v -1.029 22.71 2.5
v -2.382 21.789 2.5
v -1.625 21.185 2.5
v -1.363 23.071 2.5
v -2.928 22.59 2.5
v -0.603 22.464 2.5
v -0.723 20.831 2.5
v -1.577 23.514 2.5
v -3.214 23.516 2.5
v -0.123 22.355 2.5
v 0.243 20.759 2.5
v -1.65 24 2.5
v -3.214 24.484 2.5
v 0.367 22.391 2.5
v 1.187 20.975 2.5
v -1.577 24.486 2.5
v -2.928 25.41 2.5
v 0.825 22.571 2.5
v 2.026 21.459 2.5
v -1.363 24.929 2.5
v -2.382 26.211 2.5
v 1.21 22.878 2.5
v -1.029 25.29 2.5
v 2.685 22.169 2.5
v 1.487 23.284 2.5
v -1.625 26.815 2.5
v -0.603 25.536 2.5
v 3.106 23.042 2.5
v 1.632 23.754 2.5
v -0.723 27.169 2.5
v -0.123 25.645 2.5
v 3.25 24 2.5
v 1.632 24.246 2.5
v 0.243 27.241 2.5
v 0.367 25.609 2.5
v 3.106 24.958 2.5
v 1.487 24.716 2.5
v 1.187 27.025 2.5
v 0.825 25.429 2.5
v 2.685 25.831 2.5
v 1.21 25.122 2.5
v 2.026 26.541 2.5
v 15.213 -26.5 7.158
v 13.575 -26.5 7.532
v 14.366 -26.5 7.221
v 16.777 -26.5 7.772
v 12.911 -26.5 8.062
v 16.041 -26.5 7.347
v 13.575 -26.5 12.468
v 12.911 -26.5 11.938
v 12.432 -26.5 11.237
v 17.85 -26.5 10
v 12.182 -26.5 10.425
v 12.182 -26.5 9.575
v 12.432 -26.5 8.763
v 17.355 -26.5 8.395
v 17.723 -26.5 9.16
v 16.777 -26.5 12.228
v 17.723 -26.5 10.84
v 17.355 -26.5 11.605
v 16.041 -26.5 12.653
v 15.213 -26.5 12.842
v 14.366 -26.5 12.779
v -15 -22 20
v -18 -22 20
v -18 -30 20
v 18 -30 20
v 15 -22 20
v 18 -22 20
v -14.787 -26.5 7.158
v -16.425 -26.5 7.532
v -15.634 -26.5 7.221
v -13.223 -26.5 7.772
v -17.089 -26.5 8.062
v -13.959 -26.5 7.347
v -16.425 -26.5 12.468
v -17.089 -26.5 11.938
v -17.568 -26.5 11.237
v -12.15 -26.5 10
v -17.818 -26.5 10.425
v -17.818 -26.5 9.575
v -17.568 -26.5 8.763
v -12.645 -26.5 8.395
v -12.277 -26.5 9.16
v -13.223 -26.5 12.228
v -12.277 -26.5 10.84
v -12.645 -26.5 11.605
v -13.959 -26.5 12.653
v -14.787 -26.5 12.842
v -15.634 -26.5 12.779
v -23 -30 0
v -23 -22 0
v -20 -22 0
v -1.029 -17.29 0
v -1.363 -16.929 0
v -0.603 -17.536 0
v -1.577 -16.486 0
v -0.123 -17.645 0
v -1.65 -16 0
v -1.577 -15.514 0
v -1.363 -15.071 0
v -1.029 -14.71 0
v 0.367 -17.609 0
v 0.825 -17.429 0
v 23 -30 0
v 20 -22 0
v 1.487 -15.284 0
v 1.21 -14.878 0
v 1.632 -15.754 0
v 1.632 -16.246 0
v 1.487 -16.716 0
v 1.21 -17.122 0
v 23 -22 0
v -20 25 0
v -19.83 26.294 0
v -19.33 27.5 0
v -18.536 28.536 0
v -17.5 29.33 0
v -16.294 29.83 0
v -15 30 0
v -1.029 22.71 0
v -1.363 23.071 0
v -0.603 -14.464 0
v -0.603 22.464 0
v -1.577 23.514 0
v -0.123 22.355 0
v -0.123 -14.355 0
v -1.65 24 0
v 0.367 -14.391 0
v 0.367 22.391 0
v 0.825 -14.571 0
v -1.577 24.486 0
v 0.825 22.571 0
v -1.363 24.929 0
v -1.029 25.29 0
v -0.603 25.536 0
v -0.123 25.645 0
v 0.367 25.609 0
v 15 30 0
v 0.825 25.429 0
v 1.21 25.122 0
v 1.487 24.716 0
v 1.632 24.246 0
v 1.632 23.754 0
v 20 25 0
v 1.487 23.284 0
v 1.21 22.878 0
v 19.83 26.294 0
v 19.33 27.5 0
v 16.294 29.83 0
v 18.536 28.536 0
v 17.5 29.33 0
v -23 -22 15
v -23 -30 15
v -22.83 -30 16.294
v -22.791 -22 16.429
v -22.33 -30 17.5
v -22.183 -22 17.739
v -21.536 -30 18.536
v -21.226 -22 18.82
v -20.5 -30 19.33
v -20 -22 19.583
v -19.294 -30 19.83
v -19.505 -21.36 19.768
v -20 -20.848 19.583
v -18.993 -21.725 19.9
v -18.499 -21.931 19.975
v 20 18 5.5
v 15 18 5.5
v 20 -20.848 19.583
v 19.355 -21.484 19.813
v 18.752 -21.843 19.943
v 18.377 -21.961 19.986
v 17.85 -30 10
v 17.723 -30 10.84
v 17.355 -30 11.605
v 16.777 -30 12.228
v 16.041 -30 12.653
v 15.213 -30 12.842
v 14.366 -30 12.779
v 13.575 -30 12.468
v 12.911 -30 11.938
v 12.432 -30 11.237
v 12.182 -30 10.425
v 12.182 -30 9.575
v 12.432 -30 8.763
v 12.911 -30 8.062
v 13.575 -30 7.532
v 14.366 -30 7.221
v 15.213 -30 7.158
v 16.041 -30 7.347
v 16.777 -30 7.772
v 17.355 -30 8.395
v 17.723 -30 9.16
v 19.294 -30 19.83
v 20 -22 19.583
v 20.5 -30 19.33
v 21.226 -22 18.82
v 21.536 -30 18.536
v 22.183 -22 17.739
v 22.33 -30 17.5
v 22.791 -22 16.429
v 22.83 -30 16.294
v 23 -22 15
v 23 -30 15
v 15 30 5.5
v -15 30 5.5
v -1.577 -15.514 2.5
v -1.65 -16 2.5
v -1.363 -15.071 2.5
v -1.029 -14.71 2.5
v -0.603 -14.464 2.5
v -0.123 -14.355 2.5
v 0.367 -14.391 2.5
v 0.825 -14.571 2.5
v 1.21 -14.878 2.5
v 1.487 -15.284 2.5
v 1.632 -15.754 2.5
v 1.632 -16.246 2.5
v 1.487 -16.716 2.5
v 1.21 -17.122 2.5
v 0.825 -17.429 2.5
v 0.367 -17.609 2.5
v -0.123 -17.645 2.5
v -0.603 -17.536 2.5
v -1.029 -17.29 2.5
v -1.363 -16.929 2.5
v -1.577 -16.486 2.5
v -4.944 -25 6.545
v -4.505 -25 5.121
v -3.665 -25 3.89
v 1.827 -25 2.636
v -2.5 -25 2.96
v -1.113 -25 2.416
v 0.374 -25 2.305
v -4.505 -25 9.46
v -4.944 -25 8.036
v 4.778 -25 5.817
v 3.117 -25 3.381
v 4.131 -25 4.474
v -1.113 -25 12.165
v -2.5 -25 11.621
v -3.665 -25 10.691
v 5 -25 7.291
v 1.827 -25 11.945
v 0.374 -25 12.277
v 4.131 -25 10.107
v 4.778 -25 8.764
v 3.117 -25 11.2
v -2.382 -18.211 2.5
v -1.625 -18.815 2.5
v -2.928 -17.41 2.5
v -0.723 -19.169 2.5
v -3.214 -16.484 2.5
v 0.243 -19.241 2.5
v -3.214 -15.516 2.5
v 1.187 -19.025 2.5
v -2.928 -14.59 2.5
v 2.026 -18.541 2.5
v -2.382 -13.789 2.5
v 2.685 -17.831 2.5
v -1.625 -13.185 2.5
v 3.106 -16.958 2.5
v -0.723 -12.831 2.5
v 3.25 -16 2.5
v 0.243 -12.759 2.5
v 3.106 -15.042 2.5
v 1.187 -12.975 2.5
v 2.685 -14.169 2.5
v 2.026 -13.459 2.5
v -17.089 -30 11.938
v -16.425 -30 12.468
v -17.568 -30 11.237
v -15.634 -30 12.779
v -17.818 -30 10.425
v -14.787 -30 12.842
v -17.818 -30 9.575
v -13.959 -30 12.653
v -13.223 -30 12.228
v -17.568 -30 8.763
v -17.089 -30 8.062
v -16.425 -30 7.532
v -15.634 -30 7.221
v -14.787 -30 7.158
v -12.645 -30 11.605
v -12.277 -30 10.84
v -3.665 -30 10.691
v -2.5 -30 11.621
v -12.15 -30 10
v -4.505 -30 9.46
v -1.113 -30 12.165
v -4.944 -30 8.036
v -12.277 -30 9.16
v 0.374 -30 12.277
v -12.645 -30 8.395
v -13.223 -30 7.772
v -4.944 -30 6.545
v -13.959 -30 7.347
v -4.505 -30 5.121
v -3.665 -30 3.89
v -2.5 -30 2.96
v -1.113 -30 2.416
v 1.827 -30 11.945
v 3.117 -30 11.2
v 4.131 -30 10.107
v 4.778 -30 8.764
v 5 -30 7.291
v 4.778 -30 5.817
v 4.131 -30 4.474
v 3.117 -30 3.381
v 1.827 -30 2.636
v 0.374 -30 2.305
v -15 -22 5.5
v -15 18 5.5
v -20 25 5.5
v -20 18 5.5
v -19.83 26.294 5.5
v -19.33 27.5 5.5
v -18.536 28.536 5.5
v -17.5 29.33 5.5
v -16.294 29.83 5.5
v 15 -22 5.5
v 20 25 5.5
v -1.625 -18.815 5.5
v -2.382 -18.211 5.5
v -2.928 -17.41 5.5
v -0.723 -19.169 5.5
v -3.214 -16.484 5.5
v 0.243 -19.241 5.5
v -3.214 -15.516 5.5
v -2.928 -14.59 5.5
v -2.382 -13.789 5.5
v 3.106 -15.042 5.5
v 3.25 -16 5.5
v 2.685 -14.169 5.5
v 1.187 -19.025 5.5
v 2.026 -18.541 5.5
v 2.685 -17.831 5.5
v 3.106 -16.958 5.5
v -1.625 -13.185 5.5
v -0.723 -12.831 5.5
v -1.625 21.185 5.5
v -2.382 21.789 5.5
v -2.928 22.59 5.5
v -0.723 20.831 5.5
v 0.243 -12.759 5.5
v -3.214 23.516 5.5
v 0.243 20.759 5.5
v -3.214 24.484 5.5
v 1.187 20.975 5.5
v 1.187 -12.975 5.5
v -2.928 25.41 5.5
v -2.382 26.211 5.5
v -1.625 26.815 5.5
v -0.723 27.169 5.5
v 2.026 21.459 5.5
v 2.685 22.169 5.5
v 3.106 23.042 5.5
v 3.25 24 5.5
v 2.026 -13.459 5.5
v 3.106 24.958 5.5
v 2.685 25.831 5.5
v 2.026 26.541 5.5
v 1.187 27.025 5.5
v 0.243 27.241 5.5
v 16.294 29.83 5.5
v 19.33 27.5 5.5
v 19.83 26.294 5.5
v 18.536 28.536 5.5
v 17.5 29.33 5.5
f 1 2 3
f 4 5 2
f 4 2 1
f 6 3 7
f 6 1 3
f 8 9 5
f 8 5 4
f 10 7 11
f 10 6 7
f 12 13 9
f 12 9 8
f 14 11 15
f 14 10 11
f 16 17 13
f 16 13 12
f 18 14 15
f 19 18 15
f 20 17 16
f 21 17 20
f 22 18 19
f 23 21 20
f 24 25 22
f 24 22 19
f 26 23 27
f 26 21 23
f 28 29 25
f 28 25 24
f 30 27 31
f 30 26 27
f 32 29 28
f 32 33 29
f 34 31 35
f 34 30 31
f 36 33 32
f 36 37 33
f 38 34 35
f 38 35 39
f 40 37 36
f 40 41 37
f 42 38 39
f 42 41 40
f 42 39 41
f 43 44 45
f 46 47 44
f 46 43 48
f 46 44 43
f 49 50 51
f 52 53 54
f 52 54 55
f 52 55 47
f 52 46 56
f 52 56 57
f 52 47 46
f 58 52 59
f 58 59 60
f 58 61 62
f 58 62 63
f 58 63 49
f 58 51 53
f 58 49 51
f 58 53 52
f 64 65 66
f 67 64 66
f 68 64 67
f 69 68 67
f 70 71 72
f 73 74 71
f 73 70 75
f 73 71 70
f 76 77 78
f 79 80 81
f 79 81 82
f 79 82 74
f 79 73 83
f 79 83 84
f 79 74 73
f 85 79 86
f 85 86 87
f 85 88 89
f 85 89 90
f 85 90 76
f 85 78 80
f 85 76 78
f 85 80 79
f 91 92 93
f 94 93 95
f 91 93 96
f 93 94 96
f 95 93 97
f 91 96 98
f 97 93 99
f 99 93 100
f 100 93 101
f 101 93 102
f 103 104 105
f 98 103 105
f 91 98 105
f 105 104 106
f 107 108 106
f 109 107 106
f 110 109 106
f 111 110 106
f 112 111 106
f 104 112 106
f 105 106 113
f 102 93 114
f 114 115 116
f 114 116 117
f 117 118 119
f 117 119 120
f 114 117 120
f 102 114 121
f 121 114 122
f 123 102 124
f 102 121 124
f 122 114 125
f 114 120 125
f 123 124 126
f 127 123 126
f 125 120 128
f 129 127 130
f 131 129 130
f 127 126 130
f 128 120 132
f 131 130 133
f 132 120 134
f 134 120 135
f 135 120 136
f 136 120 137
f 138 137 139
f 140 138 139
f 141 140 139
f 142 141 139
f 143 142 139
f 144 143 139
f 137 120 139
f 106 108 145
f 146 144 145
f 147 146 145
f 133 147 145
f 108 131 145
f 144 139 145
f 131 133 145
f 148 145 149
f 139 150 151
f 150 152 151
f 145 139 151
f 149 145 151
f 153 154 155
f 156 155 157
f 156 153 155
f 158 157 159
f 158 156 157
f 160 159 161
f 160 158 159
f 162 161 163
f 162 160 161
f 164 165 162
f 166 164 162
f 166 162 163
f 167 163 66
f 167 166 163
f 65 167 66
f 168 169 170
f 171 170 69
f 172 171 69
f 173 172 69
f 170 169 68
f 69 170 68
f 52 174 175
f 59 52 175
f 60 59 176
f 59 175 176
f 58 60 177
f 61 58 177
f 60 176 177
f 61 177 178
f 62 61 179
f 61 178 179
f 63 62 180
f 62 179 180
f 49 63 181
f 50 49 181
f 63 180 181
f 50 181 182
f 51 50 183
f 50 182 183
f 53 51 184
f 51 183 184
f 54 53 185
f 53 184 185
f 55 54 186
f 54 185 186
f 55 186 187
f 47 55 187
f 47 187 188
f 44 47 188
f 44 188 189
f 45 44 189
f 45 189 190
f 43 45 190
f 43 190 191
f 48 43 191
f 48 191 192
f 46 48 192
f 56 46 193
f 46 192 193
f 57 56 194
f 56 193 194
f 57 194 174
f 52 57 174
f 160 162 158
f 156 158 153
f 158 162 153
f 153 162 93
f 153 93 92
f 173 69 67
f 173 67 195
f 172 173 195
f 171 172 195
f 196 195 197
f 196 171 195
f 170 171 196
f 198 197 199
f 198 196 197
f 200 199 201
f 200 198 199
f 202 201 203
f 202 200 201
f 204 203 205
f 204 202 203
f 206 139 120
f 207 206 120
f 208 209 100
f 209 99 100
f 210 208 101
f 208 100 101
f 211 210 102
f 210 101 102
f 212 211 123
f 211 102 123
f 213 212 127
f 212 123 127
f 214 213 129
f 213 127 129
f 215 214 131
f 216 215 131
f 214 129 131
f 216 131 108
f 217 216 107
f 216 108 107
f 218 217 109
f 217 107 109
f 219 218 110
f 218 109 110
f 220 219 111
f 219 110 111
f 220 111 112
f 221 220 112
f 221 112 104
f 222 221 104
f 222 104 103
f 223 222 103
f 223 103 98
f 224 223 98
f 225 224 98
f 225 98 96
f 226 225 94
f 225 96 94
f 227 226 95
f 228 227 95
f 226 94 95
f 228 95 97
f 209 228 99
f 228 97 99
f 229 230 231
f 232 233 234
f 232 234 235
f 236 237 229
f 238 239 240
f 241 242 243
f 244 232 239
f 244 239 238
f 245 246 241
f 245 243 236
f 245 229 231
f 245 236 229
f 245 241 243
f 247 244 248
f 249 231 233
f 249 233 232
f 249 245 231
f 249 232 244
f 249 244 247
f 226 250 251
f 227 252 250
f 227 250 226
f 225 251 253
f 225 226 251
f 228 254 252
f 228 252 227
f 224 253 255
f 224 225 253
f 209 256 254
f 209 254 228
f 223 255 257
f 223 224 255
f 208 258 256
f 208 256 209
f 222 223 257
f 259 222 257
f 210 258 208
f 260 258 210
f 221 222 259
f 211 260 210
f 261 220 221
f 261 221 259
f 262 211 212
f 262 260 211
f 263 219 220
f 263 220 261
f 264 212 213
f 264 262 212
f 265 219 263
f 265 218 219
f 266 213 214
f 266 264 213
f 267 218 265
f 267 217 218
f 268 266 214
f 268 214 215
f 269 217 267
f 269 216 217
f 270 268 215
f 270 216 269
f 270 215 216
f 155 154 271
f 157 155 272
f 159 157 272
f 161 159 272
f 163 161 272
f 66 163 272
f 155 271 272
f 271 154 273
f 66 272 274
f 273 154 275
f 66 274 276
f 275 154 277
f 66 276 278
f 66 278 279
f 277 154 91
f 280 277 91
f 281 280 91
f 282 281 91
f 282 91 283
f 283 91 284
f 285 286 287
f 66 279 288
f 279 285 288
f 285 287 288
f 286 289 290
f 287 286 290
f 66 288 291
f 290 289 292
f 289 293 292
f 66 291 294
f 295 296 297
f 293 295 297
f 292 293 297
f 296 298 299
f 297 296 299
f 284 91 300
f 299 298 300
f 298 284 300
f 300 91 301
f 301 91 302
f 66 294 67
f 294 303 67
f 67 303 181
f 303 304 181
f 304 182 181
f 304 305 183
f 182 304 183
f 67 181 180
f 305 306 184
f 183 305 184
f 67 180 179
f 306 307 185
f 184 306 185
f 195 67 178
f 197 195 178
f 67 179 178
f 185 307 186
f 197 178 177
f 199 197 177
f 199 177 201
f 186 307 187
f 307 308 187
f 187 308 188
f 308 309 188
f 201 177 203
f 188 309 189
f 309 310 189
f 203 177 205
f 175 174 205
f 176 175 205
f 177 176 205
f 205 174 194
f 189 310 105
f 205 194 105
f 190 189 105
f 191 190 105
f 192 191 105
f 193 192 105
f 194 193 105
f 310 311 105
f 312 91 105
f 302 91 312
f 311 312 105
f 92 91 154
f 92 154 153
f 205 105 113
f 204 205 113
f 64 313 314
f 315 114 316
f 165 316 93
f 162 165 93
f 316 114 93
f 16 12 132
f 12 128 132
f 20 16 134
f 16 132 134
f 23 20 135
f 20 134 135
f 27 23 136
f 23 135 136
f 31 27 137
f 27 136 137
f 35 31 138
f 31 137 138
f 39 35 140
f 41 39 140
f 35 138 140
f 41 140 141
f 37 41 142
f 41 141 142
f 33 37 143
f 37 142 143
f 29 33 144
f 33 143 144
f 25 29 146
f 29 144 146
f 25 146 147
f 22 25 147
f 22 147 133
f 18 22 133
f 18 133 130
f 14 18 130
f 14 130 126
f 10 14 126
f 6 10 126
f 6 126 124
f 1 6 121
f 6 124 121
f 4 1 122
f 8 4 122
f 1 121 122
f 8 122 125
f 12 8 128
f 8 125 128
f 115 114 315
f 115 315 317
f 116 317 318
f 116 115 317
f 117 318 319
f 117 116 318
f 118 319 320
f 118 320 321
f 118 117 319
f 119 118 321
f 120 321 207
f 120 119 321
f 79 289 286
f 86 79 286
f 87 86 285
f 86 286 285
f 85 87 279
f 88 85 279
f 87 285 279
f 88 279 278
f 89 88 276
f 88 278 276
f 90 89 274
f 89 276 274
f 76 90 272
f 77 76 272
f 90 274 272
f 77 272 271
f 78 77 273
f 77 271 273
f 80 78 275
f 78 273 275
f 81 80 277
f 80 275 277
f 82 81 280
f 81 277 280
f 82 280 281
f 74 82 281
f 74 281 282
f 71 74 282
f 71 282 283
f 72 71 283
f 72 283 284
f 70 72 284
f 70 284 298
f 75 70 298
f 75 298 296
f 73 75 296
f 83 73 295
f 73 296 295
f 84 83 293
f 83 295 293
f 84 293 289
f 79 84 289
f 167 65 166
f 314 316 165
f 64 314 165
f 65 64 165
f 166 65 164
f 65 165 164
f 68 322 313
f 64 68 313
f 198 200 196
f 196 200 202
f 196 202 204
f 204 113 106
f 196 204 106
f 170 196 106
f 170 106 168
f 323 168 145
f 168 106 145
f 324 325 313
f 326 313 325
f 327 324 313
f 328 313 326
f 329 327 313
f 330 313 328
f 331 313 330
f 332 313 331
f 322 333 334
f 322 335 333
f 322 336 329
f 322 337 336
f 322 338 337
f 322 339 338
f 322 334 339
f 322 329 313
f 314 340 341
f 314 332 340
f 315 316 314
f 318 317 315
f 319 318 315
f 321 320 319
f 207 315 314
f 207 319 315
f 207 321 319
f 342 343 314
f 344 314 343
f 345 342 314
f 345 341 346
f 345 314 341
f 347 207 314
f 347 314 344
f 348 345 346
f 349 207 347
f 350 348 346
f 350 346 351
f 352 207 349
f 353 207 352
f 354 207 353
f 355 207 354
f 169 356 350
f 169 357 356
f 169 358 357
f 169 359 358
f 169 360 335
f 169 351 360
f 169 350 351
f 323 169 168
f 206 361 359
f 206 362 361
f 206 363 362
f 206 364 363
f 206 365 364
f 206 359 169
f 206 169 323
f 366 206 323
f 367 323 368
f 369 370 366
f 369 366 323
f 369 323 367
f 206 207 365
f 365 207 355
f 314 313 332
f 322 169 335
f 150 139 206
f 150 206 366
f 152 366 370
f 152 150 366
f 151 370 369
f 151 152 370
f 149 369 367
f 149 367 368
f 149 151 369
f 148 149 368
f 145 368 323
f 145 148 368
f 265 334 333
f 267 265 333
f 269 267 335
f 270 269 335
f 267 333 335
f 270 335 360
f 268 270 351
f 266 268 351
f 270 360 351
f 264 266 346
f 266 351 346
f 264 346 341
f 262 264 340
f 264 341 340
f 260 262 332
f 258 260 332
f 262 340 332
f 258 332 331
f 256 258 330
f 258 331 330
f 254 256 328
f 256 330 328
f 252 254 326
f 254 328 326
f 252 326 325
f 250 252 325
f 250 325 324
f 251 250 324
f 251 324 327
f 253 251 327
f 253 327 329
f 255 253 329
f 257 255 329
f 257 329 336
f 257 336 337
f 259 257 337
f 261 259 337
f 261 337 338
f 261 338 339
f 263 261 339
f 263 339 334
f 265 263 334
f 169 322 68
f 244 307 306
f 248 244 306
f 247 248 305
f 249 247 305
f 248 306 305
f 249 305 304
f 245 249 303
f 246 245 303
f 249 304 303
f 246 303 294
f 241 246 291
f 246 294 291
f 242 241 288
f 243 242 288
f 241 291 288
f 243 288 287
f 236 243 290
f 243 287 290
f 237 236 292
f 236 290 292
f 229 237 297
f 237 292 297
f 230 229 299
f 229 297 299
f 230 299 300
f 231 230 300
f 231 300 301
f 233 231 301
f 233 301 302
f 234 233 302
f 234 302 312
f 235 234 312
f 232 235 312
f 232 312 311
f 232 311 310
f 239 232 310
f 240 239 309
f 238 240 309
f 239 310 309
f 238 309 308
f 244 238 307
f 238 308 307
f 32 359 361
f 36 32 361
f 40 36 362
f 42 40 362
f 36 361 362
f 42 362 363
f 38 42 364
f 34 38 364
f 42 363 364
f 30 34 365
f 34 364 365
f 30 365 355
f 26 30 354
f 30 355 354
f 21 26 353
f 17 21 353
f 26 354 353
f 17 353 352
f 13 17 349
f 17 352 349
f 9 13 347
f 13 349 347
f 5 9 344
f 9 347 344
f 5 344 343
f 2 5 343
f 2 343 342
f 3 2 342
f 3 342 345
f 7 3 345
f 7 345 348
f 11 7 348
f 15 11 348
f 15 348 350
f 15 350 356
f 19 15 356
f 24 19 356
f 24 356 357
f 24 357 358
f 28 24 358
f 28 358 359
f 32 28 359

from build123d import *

# Parameters (mm, degrees)
F0_W           = 3
F0_H           = 8
F1_DEPTH       = 20
F0_W_2         = 30
F0_H_2         = 12
F0_H_3         = 40
F0_W_3         = 5
F2_DEPTH       = 5.5
F3_DEPTH       = 20
F5_DEPTH       = 43.001
F7_D           = 3.3
F7_DEPTH       = 13.5002857143
F7_CBORE_D     = 6.5
F7_CBORE_DEPTH = 3
F7_TIP         = 0.9914200214
F8_R           = 5
F9_DEPTH       = 5
F8_R_2         = 2.85
F10_DEPTH      = 3.5
F11_T1_DEPTH   = 30.5
F11_T3_DEPTH   = 33


# Not quite as in the source:
# - a fillet or chamfer that OpenCascade refuses, or shapes differently, is made with other operations: its cross-section is extruded or revolved along the edge and cut away or added


with BuildPart() as f1:
    # F0 (on Top) → F1 (new body)
    with BuildSketch(Plane.XY):
        Polygon((20, -30), (20, -22), (15, -22), (-15, -22), (-20, -22), (-20, -30), align=None)
        with Locations((-21.5, -26)):
            Rectangle(F0_W, F0_H)
        with Locations((21.5, -26)):
            Rectangle(F0_W, F0_H)
    extrude(amount=F1_DEPTH)

    # F0 (on Top) → F2 (join)
    with BuildSketch(Plane.XY):
        with Locations((0, 24)):
            Rectangle(F0_W_2, F0_H_2)
        with Locations((0, -2)):
            Rectangle(F0_W_2, F0_H_3)
        with Locations((-17.5, 24)):
            Rectangle(F0_W_3, F0_H_2)
        with Locations((-17.5, -2)):
            Rectangle(F0_W_3, F0_H_3)
        with Locations((17.5, 24)):
            Rectangle(F0_W_3, F0_H_2)
        with Locations((17.5, -2)):
            Rectangle(F0_W_3, F0_H_3)
    extrude(amount=F2_DEPTH)

    # F0 (on Top) → F3 (join)
    with BuildSketch(Plane.XY):
        with Locations((-17.5, -2)):
            Rectangle(F0_W_3, F0_H_3)
        with Locations((17.5, -2)):
            Rectangle(F0_W_3, F0_H_3)
    extrude(amount=F3_DEPTH)

    # F4 (on face) → F5 (cut, through all)
    with BuildSketch(Plane(origin=(-20, 0, 0), x_dir=(0, -1, 0), z_dir=(-1, 0, 0))):
        Polygon((-18, 20), (-18, 5.5), (22, 20), align=None)
    extrude(amount=-F5_DEPTH, mode=Mode.SUBTRACT)

    # F7
    with Locations(Plane.XY.offset(5.5)):
        with Locations((0, 24), (0, -16)):
            CounterBoreHole(F7_D / 2, F7_CBORE_D / 2, F7_CBORE_DEPTH, depth=F7_DEPTH)
            with Locations((0, 0, -(F7_DEPTH + F7_TIP / 2))):  # 118° drill point
                Cone(0, F7_D / 2, F7_TIP, mode=Mode.SUBTRACT)

    # F8 (on face) → F9 (cut)
    with BuildSketch(Plane.XZ.offset(30)):
        with Locations((0, 7.2906266057)):
            Circle(F8_R)
    extrude(amount=-F9_DEPTH, mode=Mode.SUBTRACT)

    # F8 (on face) → F10 (cut)
    with BuildSketch(Plane.XZ.offset(30)):
        with Locations((-15, 10)):
            Circle(F8_R_2)
        with Locations((15, 10)):
            Circle(F8_R_2)
    extrude(amount=-F10_DEPTH, mode=Mode.SUBTRACT)

    # F11: fillet of radius 5 on 4 edges, made by hand

    # F11_s2 → F11_t1 (cut)
    with BuildSketch(Plane.XY.offset(-12.5)):
        with BuildLine():
            ThreePointArc((15, 30), (18.5355339059, 28.5355339059), (20, 25))
            Line((20, 25), (20, 30))
            Line((20, 30), (15, 30))
        make_face()
        with BuildLine():
            ThreePointArc((-20, 25), (-18.5355339059, 28.5355339059), (-15, 30))
            Line((-15, 30), (-20, 30))
            Line((-20, 30), (-20, 25))
        make_face()
    extrude(amount=F11_T1_DEPTH, mode=Mode.SUBTRACT)

    # F11_s4 → F11_t3 (cut)
    with BuildSketch(Plane.XZ.offset(9.5)):
        with BuildLine():
            ThreePointArc((-23, 15), (-21.5355339059, 18.5355339059), (-18, 20))
            Line((-18, 20), (-23, 20))
            Line((-23, 20), (-23, 15))
        make_face()
        with BuildLine():
            ThreePointArc((18, 20), (21.5355339059, 18.5355339059), (23, 15))
            Line((23, 15), (23, 20))
            Line((23, 20), (18, 20))
        make_face()
    extrude(amount=F11_T3_DEPTH, mode=Mode.SUBTRACT)


solid = f1.part
